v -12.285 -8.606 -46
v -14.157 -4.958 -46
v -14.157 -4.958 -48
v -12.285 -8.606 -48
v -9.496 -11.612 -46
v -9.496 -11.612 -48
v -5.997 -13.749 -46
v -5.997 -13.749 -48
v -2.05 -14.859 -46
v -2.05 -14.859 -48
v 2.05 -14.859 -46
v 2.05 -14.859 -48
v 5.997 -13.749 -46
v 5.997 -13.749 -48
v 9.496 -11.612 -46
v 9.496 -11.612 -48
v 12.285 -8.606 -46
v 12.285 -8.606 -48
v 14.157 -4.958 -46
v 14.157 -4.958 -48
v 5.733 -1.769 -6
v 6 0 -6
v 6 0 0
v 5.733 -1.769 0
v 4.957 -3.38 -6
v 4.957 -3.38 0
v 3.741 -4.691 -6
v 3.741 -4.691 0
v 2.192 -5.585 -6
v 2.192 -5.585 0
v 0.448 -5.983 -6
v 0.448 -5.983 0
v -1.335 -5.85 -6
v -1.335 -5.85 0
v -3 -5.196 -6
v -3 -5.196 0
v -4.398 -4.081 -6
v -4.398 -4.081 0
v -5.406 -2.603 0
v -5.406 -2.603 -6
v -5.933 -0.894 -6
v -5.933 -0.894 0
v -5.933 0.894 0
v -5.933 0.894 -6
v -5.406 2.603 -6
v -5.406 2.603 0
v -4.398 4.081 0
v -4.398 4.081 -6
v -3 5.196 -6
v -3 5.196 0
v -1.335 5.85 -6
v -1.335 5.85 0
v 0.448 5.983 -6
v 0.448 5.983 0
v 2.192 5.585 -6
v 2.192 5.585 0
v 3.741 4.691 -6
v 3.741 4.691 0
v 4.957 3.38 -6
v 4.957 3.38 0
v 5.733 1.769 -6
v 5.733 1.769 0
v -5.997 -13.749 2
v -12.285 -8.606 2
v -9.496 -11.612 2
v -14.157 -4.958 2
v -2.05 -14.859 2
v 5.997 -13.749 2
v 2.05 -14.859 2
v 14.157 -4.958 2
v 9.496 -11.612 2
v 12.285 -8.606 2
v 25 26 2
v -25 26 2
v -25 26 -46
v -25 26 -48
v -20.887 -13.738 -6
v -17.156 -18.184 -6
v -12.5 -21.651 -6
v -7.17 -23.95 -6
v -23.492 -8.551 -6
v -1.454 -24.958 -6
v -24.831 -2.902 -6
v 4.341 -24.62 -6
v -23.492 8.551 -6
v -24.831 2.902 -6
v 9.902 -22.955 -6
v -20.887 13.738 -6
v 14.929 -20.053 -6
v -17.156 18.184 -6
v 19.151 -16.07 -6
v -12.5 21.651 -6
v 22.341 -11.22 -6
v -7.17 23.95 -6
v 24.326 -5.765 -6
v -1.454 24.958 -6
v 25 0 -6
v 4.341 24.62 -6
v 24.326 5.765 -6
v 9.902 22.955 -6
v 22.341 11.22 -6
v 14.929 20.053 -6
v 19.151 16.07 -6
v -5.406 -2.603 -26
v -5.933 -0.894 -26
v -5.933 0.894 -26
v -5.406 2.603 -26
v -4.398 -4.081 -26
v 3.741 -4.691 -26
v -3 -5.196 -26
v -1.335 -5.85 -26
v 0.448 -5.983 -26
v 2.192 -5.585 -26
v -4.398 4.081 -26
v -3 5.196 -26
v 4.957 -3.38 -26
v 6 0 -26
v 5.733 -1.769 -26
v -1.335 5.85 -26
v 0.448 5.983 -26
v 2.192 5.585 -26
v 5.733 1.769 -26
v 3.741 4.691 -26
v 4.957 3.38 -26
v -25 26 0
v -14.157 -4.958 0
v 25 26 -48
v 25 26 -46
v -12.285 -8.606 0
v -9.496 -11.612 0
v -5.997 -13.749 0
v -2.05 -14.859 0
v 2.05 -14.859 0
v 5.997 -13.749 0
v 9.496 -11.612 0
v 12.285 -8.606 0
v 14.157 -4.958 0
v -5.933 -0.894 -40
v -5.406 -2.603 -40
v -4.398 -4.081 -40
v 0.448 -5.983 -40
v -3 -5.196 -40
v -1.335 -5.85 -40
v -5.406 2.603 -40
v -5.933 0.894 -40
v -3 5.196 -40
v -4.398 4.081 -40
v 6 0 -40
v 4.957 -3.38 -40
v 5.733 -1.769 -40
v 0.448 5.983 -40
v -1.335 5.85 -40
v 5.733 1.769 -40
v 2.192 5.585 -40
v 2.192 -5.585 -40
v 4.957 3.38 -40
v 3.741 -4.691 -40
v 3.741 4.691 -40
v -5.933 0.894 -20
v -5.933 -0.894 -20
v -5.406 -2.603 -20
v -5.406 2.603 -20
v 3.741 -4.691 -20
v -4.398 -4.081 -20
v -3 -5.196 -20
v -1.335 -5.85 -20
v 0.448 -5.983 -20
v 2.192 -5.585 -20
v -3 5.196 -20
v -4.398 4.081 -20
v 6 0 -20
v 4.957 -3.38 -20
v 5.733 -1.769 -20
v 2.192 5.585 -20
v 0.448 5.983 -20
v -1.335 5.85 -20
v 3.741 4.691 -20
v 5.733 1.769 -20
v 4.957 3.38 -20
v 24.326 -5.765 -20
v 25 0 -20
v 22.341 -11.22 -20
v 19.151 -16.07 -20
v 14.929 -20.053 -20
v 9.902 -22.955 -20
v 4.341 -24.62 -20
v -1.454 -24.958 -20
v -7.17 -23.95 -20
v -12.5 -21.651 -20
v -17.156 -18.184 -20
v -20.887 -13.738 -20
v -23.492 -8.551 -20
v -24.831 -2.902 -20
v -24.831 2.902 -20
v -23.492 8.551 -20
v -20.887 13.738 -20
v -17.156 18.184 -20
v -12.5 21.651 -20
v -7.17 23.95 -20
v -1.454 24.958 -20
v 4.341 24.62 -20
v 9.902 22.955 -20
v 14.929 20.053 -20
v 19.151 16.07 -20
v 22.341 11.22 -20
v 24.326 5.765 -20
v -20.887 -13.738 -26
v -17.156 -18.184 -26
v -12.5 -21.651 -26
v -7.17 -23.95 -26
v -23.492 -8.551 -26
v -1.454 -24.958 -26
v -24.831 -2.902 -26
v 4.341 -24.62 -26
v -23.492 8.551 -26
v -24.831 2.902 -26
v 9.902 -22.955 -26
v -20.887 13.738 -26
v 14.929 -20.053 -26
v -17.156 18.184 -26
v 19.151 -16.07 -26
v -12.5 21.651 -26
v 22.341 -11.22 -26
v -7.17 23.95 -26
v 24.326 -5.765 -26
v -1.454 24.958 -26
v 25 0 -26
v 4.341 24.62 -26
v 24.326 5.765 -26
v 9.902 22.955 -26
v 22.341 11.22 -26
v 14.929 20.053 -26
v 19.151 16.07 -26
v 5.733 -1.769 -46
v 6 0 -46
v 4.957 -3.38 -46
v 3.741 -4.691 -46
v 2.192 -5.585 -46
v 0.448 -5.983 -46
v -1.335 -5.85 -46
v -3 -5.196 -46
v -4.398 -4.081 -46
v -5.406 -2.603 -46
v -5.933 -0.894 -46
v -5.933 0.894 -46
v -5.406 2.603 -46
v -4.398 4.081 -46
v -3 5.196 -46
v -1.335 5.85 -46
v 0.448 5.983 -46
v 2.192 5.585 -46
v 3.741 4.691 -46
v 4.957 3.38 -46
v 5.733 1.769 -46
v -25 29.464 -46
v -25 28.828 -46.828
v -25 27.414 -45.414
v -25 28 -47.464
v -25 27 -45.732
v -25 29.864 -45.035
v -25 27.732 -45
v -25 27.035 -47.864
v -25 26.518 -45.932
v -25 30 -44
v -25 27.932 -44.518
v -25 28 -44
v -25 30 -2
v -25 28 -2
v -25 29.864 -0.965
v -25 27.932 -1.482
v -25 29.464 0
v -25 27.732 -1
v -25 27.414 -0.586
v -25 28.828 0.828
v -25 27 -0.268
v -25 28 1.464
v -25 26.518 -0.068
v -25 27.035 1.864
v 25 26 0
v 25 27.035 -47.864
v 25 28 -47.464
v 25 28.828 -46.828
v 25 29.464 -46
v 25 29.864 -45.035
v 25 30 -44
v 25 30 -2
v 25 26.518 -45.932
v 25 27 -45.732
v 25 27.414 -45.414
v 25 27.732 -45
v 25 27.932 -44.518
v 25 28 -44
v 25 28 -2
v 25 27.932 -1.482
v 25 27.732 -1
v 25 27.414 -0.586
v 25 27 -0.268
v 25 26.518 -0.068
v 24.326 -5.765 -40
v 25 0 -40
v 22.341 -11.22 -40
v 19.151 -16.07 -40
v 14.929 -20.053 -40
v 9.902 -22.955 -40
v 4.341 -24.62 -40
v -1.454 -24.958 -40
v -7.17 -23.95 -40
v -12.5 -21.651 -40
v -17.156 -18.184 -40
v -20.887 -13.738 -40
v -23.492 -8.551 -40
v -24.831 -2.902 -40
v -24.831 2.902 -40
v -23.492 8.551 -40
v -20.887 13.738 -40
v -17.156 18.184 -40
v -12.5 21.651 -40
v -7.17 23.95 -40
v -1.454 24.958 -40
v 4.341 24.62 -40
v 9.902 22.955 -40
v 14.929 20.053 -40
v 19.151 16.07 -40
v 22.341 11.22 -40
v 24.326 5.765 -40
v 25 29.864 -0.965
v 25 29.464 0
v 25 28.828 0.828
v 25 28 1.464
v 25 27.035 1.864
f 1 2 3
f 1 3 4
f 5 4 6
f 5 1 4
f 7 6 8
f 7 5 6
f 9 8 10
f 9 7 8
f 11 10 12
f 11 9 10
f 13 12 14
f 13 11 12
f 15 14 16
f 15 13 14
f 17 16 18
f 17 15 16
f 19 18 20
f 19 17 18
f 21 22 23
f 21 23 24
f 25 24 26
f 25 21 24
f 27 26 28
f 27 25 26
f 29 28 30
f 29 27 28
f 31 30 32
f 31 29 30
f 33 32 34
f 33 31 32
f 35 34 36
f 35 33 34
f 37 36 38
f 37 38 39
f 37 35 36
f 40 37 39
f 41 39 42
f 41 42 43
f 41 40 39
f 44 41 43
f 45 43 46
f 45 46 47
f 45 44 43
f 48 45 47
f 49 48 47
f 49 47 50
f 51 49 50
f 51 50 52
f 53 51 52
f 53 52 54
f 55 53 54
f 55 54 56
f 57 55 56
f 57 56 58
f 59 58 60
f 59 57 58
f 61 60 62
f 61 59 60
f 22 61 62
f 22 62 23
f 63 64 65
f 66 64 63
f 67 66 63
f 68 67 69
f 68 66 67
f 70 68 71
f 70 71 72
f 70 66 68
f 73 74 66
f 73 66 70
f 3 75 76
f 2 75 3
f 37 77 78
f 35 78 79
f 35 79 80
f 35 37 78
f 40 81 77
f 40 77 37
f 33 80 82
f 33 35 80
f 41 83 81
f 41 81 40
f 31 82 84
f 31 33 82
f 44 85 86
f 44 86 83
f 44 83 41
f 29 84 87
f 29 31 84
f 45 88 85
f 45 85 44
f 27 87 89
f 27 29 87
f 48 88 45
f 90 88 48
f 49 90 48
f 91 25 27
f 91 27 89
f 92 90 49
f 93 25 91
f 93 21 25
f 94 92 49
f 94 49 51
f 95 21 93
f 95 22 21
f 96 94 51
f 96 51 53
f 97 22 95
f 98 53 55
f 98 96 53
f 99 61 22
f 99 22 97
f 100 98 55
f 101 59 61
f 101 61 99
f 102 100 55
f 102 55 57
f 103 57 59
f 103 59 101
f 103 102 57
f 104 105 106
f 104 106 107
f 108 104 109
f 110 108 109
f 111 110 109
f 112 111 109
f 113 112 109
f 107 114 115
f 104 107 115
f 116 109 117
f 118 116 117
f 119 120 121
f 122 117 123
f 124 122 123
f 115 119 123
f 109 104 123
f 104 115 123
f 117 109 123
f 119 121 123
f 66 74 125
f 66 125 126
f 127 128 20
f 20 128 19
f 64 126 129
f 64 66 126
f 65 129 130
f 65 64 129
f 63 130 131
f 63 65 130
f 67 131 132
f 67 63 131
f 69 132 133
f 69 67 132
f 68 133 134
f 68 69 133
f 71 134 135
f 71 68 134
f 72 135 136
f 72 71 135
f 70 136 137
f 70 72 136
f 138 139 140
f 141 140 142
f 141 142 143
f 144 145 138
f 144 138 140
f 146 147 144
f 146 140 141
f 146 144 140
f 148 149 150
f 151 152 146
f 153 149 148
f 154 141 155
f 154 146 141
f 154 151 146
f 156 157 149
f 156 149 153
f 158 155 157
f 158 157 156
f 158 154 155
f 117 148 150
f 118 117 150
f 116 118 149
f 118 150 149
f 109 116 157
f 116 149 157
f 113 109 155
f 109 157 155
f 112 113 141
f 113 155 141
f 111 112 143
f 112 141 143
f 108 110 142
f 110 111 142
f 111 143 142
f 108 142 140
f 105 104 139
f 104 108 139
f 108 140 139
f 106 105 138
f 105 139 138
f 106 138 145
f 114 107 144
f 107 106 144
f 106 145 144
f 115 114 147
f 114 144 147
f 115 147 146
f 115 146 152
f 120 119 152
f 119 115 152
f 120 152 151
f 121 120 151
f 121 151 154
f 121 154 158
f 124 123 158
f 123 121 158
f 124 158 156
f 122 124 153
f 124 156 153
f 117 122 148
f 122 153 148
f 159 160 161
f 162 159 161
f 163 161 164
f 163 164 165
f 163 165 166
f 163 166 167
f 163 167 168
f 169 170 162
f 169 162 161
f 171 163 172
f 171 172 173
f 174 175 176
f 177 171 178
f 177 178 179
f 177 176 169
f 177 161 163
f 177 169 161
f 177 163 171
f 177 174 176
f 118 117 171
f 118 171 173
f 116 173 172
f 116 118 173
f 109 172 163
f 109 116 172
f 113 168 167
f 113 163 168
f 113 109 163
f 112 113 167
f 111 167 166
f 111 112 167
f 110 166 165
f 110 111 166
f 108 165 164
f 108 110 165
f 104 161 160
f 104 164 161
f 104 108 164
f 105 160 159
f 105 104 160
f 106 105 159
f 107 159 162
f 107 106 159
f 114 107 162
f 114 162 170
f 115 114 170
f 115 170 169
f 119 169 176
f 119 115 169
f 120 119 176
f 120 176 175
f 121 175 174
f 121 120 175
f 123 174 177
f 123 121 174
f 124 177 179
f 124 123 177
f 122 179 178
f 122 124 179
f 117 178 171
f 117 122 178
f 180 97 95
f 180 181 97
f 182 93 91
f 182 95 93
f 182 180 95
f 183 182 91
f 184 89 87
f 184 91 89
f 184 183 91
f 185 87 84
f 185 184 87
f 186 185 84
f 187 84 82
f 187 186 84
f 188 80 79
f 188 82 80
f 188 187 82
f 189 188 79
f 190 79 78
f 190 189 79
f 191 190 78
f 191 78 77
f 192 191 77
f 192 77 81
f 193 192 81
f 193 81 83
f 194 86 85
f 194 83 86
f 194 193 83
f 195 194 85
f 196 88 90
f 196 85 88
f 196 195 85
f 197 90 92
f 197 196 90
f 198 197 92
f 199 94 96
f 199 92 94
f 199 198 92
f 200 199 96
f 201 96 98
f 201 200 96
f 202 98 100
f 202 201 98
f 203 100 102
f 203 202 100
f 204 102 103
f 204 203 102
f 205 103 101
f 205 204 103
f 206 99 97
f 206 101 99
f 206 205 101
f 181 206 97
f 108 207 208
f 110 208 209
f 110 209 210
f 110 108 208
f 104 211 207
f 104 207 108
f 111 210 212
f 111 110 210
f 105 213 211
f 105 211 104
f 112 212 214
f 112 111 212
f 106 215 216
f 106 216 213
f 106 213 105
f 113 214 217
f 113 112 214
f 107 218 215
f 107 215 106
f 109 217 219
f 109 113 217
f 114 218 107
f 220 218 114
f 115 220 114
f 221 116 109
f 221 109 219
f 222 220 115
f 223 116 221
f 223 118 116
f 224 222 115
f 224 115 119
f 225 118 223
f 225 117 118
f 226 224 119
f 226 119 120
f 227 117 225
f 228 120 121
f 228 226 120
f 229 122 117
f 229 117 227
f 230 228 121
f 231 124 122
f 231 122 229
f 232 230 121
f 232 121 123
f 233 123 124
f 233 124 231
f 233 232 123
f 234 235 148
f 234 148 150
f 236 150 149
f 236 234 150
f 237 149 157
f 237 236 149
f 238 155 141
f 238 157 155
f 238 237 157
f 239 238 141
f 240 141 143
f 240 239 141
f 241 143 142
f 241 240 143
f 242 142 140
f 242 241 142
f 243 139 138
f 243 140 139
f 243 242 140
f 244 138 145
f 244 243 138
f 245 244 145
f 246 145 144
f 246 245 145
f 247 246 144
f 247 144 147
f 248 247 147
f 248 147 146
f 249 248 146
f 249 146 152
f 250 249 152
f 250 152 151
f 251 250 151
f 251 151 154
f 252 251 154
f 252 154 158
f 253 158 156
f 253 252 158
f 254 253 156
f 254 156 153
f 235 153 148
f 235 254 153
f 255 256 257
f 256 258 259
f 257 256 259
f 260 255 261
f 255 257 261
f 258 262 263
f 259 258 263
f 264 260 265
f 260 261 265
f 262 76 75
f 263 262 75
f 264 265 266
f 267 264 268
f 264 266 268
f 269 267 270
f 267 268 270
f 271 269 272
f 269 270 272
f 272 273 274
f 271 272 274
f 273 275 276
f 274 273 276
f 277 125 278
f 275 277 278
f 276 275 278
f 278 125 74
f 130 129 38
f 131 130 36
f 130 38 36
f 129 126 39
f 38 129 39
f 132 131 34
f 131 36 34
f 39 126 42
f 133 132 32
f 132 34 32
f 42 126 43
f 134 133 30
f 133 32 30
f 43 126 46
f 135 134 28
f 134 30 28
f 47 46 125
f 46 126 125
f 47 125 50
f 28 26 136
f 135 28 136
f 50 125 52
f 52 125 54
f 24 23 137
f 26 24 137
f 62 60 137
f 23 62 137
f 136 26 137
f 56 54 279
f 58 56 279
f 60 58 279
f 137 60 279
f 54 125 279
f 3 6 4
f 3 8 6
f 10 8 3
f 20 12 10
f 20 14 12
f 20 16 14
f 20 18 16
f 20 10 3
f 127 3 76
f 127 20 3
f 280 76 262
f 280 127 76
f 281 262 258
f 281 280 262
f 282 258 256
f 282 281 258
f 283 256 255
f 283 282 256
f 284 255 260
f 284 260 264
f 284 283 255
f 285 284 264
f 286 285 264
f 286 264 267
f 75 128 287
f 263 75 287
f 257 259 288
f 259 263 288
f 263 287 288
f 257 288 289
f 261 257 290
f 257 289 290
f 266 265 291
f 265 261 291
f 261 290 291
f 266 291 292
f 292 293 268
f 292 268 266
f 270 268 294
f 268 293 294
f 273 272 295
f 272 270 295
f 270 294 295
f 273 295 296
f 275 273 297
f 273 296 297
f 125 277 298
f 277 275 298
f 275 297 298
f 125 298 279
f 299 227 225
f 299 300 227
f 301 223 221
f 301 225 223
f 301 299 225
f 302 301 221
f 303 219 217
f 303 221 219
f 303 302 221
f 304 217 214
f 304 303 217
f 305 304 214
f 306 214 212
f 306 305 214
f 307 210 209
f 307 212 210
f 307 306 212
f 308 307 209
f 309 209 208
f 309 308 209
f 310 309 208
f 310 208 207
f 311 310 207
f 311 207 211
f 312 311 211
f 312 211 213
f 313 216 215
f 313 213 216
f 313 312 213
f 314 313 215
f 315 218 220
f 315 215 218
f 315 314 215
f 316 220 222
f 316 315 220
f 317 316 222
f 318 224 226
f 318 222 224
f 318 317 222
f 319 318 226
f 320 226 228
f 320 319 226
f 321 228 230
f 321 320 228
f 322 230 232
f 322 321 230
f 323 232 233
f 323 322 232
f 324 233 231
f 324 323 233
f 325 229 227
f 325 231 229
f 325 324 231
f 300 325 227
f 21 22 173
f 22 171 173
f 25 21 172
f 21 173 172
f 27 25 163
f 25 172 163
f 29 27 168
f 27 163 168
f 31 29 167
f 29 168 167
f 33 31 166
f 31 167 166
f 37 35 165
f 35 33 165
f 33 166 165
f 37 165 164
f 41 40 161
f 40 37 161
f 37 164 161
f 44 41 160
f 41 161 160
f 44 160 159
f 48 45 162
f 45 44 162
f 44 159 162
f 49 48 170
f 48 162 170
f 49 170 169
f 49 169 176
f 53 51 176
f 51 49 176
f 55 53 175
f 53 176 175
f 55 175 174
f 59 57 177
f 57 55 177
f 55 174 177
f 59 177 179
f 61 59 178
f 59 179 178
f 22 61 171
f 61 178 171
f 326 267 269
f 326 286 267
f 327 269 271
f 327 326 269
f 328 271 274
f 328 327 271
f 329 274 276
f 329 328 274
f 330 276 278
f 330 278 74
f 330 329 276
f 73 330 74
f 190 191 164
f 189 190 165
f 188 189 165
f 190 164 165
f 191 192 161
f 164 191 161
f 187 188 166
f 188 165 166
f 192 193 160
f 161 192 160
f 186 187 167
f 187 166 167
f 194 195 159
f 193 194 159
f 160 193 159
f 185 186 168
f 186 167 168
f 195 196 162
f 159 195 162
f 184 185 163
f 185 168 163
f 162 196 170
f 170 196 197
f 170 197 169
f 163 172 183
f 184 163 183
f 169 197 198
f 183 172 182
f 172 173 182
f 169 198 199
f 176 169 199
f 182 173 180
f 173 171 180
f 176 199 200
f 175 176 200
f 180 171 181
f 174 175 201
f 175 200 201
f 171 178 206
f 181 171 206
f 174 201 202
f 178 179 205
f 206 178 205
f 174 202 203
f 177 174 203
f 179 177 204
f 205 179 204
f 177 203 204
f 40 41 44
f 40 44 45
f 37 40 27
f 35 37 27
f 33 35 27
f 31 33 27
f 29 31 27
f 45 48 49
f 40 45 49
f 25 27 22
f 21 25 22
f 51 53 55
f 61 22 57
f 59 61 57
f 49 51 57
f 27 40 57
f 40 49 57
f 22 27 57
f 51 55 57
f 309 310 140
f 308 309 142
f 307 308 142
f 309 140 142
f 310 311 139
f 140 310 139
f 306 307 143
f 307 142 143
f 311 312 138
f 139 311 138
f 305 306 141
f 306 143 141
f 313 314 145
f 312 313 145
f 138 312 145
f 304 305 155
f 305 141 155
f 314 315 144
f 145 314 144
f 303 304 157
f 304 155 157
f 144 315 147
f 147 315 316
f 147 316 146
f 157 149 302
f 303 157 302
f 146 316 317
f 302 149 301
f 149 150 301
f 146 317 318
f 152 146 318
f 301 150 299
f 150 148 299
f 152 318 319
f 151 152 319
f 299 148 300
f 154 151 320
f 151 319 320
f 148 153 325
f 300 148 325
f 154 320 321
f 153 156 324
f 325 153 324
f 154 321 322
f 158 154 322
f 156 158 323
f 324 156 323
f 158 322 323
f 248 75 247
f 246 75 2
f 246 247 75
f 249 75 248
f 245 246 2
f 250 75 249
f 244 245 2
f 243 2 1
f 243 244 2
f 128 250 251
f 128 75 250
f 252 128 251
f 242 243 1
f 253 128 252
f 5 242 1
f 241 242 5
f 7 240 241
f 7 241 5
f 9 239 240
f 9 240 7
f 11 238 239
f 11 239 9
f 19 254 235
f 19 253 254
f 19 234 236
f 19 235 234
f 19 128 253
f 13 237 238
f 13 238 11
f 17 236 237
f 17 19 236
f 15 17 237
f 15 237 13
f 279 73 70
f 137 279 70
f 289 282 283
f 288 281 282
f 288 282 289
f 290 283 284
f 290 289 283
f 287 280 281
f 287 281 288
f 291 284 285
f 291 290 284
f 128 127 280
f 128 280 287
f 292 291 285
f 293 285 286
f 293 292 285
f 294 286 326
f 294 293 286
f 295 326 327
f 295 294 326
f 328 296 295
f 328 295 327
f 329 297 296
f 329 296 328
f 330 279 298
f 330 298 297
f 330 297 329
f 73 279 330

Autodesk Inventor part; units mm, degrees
ref_plane "YZ Plane" through (0, 0, 0) normal (1, 0, 0) x (0, 1, 0)
ref_plane "XZ Plane" through (0, 0, 0) normal (0, 1, 0) x (-1, 0, 0)
ref_plane "XY Plane" through (0, 0, 0) normal (0, 0, 1) x (1, 0, 0)
sketch "Sketch3" plane through (0, 0, 0) normal (0, 0, 1) x (1, 0, 0)
  line L0 (-14.3279, -4.4399) -> (-25, 30)
  line L1 (-25, 30) -> (25, 30)
  line L2 (25, 30) -> (14.3279, -4.4399)
  circle A0 centre (0, 0) radius 15
  line L3 (-25, 30) -> (25, 30)
  line L4 (25, 30) -> (25, -15)
  line L5 (25, -15) -> (-25, -15)
  line L6 (-25, -15) -> (-25, 30)
  dimension "d0" = 50
  dimension "d1" = 30
  dimension "d2" = 30
  dimension "d24" = 50
extrude "Plate1" add sketch "Sketch3" along normal blind 2
sketch "Sketch8" plane through (25, 28, 2) normal (0, 1, 0) x (-1, 0, 0)
  line L0 (50, 0) -> (0, 0)
  line L1 (0, 0) -> (0, -50)
  line L2 (0, -50) -> (50, -50)
  line L3 (50, -50) -> (50, 0)
edge flange "Flange3" height 50 angle 90 thickness 2 bend radius 2 thickness toward (0, 1, 0) relief tear relief width 2 relief depth 1 edges at (0, 30, 0) wall of the first edge with corners at (-25, 28, 2) (25, 28, 2) (25, 28, -48) (-25, 28, -48)
bend "Bend5"
corner "Corner3"
sketch "Sketch9" plane through (25, 30, -46) normal (0, 0, -1) x (-1, 0, 0)
  line L0 (50, 0) -> (0, 0)
  line L1 (0, 0) -> (0, -45)
  line L2 (0, -45) -> (50, -45)
  line L3 (50, -45) -> (50, 0)
edge flange "Flange4" height 45 angle 90 thickness 2 bend radius 2 thickness toward (0, 0, -1) relief tear relief width 2 relief depth 1 edges at (0, 28, -48) wall of the first edge with corners at (-25, 30, -46) (25, 30, -46) (25, -15, -46) (-25, -15, -46)
bend "Bend6"
corner "Corner4"
sketch "Sketch11" plane through (0, 0, 2) normal (0, 0, 1) x (1, 0, 0)
  line L0 (25, 26) -> (-25, 26) projected
  line L1 (-25, -15) -> (-25, 26) projected
  line L2 (25, -15) -> (-25, -15) projected
  line L3 (25, 26) -> (25, -15) projected
  arc A0 (-14.1568, -4.9584) -> (14.1568, -4.9584) centre (0, 0) ccw
  line L4 (-25, 26) -> (-14.1568, -4.9584)
  line L5 (25, 26) -> (14.1568, -4.9584)
extrude "Cut2" cut sketch "Sketch11" against normal through all contours L3 L2 A0 L5 | L4 A0 L2 L1
sketch "Sketch12" plane through (-25, 26, -46) normal (0, 0, 1) x (1, 0, 0)
  arc A0 (10.8432, -30.9584) -> (39.1568, -30.9584) centre (25, -26) ccw projected
  circle A1 centre (25, -26) radius 6
  dimension "d59" = 12
extrude "Extrusion1" add sketch "Sketch12" along normal blind 6
sketch "Sketch13" plane through (0, 0, -40) normal (0, 0, 1) x (1, 0, 0)
  circle A0 centre (0, 0) radius 6 projected
  circle A1 centre (0, 0) radius 25
  dimension "d62" = 50
extrude "Extrusion2" add sketch "Sketch13" along normal blind 14
sketch "Sketch14" plane through (0, 0, -26) normal (0, 0, 1) x (1, 0, 0)
  circle A0 centre (0, 0) radius 6 projected
extrude "Extrusion3" add sketch "Sketch14" along normal blind 6
sketch "Sketch15" plane through (0, 0, -20) normal (0, 0, 1) x (1, 0, 0)
  circle A0 centre (0, 0) radius 6 projected
  circle A1 centre (0, 0) radius 6 projected
  circle A2 centre (0, 0) radius 25 projected
extrude "Extrusion4" add sketch "Sketch15" along normal blind 14
sketch "Sketch16" plane through (0, 0, -6) normal (0, 0, 1) x (1, 0, 0)
  circle A0 centre (0, 0) radius 6 projected
extrude "Extrusion5" add sketch "Sketch16" along normal up to next
equation "\"d57\" = Thickness"
equation "\"d35\" = BendReliefWidth"
equation "\"d36\" = BendReliefDepth"
equation "\"d37\" = MinimumRemnant"
equation "\"d38\" = BendRadius"
equation "\"d41\" = BendRadius"
equation "\"d42\" = CornerReliefSize"
equation "\"d43\" = GapSize"
equation "\"d44\" = JacobiRadiusSize"
equation "\"d45\" = BendReliefWidth"
equation "\"d46\" = BendReliefDepth"
equation "\"d47\" = MinimumRemnant"
equation "\"d48\" = BendRadius"
equation "\"d51\" = BendRadius"
equation "\"d52\" = CornerReliefSize"
equation "\"d53\" = GapSize"
equation "\"d54\" = JacobiRadiusSize"
equation "\"BendRadius\" = Thickness"
equation "\"BendReliefWidth\" = Thickness"
equation "\"BendReliefDepth\" = 0.5 * Thickness"
equation "\"CornerReliefSize\" = 4 * Thickness"
equation "\"MinimumRemnant\" = 2 * Thickness"
equation "\"TransitionRadius\" = BendRadius"
equation "\"JacobiRadiusSize\" = BendRadius"
equation "\"GapSize\" = Thickness"
equation "\"d3\" = BendRadius"
equation "\"Thickness\" = 2"
properties part number "wheel"
